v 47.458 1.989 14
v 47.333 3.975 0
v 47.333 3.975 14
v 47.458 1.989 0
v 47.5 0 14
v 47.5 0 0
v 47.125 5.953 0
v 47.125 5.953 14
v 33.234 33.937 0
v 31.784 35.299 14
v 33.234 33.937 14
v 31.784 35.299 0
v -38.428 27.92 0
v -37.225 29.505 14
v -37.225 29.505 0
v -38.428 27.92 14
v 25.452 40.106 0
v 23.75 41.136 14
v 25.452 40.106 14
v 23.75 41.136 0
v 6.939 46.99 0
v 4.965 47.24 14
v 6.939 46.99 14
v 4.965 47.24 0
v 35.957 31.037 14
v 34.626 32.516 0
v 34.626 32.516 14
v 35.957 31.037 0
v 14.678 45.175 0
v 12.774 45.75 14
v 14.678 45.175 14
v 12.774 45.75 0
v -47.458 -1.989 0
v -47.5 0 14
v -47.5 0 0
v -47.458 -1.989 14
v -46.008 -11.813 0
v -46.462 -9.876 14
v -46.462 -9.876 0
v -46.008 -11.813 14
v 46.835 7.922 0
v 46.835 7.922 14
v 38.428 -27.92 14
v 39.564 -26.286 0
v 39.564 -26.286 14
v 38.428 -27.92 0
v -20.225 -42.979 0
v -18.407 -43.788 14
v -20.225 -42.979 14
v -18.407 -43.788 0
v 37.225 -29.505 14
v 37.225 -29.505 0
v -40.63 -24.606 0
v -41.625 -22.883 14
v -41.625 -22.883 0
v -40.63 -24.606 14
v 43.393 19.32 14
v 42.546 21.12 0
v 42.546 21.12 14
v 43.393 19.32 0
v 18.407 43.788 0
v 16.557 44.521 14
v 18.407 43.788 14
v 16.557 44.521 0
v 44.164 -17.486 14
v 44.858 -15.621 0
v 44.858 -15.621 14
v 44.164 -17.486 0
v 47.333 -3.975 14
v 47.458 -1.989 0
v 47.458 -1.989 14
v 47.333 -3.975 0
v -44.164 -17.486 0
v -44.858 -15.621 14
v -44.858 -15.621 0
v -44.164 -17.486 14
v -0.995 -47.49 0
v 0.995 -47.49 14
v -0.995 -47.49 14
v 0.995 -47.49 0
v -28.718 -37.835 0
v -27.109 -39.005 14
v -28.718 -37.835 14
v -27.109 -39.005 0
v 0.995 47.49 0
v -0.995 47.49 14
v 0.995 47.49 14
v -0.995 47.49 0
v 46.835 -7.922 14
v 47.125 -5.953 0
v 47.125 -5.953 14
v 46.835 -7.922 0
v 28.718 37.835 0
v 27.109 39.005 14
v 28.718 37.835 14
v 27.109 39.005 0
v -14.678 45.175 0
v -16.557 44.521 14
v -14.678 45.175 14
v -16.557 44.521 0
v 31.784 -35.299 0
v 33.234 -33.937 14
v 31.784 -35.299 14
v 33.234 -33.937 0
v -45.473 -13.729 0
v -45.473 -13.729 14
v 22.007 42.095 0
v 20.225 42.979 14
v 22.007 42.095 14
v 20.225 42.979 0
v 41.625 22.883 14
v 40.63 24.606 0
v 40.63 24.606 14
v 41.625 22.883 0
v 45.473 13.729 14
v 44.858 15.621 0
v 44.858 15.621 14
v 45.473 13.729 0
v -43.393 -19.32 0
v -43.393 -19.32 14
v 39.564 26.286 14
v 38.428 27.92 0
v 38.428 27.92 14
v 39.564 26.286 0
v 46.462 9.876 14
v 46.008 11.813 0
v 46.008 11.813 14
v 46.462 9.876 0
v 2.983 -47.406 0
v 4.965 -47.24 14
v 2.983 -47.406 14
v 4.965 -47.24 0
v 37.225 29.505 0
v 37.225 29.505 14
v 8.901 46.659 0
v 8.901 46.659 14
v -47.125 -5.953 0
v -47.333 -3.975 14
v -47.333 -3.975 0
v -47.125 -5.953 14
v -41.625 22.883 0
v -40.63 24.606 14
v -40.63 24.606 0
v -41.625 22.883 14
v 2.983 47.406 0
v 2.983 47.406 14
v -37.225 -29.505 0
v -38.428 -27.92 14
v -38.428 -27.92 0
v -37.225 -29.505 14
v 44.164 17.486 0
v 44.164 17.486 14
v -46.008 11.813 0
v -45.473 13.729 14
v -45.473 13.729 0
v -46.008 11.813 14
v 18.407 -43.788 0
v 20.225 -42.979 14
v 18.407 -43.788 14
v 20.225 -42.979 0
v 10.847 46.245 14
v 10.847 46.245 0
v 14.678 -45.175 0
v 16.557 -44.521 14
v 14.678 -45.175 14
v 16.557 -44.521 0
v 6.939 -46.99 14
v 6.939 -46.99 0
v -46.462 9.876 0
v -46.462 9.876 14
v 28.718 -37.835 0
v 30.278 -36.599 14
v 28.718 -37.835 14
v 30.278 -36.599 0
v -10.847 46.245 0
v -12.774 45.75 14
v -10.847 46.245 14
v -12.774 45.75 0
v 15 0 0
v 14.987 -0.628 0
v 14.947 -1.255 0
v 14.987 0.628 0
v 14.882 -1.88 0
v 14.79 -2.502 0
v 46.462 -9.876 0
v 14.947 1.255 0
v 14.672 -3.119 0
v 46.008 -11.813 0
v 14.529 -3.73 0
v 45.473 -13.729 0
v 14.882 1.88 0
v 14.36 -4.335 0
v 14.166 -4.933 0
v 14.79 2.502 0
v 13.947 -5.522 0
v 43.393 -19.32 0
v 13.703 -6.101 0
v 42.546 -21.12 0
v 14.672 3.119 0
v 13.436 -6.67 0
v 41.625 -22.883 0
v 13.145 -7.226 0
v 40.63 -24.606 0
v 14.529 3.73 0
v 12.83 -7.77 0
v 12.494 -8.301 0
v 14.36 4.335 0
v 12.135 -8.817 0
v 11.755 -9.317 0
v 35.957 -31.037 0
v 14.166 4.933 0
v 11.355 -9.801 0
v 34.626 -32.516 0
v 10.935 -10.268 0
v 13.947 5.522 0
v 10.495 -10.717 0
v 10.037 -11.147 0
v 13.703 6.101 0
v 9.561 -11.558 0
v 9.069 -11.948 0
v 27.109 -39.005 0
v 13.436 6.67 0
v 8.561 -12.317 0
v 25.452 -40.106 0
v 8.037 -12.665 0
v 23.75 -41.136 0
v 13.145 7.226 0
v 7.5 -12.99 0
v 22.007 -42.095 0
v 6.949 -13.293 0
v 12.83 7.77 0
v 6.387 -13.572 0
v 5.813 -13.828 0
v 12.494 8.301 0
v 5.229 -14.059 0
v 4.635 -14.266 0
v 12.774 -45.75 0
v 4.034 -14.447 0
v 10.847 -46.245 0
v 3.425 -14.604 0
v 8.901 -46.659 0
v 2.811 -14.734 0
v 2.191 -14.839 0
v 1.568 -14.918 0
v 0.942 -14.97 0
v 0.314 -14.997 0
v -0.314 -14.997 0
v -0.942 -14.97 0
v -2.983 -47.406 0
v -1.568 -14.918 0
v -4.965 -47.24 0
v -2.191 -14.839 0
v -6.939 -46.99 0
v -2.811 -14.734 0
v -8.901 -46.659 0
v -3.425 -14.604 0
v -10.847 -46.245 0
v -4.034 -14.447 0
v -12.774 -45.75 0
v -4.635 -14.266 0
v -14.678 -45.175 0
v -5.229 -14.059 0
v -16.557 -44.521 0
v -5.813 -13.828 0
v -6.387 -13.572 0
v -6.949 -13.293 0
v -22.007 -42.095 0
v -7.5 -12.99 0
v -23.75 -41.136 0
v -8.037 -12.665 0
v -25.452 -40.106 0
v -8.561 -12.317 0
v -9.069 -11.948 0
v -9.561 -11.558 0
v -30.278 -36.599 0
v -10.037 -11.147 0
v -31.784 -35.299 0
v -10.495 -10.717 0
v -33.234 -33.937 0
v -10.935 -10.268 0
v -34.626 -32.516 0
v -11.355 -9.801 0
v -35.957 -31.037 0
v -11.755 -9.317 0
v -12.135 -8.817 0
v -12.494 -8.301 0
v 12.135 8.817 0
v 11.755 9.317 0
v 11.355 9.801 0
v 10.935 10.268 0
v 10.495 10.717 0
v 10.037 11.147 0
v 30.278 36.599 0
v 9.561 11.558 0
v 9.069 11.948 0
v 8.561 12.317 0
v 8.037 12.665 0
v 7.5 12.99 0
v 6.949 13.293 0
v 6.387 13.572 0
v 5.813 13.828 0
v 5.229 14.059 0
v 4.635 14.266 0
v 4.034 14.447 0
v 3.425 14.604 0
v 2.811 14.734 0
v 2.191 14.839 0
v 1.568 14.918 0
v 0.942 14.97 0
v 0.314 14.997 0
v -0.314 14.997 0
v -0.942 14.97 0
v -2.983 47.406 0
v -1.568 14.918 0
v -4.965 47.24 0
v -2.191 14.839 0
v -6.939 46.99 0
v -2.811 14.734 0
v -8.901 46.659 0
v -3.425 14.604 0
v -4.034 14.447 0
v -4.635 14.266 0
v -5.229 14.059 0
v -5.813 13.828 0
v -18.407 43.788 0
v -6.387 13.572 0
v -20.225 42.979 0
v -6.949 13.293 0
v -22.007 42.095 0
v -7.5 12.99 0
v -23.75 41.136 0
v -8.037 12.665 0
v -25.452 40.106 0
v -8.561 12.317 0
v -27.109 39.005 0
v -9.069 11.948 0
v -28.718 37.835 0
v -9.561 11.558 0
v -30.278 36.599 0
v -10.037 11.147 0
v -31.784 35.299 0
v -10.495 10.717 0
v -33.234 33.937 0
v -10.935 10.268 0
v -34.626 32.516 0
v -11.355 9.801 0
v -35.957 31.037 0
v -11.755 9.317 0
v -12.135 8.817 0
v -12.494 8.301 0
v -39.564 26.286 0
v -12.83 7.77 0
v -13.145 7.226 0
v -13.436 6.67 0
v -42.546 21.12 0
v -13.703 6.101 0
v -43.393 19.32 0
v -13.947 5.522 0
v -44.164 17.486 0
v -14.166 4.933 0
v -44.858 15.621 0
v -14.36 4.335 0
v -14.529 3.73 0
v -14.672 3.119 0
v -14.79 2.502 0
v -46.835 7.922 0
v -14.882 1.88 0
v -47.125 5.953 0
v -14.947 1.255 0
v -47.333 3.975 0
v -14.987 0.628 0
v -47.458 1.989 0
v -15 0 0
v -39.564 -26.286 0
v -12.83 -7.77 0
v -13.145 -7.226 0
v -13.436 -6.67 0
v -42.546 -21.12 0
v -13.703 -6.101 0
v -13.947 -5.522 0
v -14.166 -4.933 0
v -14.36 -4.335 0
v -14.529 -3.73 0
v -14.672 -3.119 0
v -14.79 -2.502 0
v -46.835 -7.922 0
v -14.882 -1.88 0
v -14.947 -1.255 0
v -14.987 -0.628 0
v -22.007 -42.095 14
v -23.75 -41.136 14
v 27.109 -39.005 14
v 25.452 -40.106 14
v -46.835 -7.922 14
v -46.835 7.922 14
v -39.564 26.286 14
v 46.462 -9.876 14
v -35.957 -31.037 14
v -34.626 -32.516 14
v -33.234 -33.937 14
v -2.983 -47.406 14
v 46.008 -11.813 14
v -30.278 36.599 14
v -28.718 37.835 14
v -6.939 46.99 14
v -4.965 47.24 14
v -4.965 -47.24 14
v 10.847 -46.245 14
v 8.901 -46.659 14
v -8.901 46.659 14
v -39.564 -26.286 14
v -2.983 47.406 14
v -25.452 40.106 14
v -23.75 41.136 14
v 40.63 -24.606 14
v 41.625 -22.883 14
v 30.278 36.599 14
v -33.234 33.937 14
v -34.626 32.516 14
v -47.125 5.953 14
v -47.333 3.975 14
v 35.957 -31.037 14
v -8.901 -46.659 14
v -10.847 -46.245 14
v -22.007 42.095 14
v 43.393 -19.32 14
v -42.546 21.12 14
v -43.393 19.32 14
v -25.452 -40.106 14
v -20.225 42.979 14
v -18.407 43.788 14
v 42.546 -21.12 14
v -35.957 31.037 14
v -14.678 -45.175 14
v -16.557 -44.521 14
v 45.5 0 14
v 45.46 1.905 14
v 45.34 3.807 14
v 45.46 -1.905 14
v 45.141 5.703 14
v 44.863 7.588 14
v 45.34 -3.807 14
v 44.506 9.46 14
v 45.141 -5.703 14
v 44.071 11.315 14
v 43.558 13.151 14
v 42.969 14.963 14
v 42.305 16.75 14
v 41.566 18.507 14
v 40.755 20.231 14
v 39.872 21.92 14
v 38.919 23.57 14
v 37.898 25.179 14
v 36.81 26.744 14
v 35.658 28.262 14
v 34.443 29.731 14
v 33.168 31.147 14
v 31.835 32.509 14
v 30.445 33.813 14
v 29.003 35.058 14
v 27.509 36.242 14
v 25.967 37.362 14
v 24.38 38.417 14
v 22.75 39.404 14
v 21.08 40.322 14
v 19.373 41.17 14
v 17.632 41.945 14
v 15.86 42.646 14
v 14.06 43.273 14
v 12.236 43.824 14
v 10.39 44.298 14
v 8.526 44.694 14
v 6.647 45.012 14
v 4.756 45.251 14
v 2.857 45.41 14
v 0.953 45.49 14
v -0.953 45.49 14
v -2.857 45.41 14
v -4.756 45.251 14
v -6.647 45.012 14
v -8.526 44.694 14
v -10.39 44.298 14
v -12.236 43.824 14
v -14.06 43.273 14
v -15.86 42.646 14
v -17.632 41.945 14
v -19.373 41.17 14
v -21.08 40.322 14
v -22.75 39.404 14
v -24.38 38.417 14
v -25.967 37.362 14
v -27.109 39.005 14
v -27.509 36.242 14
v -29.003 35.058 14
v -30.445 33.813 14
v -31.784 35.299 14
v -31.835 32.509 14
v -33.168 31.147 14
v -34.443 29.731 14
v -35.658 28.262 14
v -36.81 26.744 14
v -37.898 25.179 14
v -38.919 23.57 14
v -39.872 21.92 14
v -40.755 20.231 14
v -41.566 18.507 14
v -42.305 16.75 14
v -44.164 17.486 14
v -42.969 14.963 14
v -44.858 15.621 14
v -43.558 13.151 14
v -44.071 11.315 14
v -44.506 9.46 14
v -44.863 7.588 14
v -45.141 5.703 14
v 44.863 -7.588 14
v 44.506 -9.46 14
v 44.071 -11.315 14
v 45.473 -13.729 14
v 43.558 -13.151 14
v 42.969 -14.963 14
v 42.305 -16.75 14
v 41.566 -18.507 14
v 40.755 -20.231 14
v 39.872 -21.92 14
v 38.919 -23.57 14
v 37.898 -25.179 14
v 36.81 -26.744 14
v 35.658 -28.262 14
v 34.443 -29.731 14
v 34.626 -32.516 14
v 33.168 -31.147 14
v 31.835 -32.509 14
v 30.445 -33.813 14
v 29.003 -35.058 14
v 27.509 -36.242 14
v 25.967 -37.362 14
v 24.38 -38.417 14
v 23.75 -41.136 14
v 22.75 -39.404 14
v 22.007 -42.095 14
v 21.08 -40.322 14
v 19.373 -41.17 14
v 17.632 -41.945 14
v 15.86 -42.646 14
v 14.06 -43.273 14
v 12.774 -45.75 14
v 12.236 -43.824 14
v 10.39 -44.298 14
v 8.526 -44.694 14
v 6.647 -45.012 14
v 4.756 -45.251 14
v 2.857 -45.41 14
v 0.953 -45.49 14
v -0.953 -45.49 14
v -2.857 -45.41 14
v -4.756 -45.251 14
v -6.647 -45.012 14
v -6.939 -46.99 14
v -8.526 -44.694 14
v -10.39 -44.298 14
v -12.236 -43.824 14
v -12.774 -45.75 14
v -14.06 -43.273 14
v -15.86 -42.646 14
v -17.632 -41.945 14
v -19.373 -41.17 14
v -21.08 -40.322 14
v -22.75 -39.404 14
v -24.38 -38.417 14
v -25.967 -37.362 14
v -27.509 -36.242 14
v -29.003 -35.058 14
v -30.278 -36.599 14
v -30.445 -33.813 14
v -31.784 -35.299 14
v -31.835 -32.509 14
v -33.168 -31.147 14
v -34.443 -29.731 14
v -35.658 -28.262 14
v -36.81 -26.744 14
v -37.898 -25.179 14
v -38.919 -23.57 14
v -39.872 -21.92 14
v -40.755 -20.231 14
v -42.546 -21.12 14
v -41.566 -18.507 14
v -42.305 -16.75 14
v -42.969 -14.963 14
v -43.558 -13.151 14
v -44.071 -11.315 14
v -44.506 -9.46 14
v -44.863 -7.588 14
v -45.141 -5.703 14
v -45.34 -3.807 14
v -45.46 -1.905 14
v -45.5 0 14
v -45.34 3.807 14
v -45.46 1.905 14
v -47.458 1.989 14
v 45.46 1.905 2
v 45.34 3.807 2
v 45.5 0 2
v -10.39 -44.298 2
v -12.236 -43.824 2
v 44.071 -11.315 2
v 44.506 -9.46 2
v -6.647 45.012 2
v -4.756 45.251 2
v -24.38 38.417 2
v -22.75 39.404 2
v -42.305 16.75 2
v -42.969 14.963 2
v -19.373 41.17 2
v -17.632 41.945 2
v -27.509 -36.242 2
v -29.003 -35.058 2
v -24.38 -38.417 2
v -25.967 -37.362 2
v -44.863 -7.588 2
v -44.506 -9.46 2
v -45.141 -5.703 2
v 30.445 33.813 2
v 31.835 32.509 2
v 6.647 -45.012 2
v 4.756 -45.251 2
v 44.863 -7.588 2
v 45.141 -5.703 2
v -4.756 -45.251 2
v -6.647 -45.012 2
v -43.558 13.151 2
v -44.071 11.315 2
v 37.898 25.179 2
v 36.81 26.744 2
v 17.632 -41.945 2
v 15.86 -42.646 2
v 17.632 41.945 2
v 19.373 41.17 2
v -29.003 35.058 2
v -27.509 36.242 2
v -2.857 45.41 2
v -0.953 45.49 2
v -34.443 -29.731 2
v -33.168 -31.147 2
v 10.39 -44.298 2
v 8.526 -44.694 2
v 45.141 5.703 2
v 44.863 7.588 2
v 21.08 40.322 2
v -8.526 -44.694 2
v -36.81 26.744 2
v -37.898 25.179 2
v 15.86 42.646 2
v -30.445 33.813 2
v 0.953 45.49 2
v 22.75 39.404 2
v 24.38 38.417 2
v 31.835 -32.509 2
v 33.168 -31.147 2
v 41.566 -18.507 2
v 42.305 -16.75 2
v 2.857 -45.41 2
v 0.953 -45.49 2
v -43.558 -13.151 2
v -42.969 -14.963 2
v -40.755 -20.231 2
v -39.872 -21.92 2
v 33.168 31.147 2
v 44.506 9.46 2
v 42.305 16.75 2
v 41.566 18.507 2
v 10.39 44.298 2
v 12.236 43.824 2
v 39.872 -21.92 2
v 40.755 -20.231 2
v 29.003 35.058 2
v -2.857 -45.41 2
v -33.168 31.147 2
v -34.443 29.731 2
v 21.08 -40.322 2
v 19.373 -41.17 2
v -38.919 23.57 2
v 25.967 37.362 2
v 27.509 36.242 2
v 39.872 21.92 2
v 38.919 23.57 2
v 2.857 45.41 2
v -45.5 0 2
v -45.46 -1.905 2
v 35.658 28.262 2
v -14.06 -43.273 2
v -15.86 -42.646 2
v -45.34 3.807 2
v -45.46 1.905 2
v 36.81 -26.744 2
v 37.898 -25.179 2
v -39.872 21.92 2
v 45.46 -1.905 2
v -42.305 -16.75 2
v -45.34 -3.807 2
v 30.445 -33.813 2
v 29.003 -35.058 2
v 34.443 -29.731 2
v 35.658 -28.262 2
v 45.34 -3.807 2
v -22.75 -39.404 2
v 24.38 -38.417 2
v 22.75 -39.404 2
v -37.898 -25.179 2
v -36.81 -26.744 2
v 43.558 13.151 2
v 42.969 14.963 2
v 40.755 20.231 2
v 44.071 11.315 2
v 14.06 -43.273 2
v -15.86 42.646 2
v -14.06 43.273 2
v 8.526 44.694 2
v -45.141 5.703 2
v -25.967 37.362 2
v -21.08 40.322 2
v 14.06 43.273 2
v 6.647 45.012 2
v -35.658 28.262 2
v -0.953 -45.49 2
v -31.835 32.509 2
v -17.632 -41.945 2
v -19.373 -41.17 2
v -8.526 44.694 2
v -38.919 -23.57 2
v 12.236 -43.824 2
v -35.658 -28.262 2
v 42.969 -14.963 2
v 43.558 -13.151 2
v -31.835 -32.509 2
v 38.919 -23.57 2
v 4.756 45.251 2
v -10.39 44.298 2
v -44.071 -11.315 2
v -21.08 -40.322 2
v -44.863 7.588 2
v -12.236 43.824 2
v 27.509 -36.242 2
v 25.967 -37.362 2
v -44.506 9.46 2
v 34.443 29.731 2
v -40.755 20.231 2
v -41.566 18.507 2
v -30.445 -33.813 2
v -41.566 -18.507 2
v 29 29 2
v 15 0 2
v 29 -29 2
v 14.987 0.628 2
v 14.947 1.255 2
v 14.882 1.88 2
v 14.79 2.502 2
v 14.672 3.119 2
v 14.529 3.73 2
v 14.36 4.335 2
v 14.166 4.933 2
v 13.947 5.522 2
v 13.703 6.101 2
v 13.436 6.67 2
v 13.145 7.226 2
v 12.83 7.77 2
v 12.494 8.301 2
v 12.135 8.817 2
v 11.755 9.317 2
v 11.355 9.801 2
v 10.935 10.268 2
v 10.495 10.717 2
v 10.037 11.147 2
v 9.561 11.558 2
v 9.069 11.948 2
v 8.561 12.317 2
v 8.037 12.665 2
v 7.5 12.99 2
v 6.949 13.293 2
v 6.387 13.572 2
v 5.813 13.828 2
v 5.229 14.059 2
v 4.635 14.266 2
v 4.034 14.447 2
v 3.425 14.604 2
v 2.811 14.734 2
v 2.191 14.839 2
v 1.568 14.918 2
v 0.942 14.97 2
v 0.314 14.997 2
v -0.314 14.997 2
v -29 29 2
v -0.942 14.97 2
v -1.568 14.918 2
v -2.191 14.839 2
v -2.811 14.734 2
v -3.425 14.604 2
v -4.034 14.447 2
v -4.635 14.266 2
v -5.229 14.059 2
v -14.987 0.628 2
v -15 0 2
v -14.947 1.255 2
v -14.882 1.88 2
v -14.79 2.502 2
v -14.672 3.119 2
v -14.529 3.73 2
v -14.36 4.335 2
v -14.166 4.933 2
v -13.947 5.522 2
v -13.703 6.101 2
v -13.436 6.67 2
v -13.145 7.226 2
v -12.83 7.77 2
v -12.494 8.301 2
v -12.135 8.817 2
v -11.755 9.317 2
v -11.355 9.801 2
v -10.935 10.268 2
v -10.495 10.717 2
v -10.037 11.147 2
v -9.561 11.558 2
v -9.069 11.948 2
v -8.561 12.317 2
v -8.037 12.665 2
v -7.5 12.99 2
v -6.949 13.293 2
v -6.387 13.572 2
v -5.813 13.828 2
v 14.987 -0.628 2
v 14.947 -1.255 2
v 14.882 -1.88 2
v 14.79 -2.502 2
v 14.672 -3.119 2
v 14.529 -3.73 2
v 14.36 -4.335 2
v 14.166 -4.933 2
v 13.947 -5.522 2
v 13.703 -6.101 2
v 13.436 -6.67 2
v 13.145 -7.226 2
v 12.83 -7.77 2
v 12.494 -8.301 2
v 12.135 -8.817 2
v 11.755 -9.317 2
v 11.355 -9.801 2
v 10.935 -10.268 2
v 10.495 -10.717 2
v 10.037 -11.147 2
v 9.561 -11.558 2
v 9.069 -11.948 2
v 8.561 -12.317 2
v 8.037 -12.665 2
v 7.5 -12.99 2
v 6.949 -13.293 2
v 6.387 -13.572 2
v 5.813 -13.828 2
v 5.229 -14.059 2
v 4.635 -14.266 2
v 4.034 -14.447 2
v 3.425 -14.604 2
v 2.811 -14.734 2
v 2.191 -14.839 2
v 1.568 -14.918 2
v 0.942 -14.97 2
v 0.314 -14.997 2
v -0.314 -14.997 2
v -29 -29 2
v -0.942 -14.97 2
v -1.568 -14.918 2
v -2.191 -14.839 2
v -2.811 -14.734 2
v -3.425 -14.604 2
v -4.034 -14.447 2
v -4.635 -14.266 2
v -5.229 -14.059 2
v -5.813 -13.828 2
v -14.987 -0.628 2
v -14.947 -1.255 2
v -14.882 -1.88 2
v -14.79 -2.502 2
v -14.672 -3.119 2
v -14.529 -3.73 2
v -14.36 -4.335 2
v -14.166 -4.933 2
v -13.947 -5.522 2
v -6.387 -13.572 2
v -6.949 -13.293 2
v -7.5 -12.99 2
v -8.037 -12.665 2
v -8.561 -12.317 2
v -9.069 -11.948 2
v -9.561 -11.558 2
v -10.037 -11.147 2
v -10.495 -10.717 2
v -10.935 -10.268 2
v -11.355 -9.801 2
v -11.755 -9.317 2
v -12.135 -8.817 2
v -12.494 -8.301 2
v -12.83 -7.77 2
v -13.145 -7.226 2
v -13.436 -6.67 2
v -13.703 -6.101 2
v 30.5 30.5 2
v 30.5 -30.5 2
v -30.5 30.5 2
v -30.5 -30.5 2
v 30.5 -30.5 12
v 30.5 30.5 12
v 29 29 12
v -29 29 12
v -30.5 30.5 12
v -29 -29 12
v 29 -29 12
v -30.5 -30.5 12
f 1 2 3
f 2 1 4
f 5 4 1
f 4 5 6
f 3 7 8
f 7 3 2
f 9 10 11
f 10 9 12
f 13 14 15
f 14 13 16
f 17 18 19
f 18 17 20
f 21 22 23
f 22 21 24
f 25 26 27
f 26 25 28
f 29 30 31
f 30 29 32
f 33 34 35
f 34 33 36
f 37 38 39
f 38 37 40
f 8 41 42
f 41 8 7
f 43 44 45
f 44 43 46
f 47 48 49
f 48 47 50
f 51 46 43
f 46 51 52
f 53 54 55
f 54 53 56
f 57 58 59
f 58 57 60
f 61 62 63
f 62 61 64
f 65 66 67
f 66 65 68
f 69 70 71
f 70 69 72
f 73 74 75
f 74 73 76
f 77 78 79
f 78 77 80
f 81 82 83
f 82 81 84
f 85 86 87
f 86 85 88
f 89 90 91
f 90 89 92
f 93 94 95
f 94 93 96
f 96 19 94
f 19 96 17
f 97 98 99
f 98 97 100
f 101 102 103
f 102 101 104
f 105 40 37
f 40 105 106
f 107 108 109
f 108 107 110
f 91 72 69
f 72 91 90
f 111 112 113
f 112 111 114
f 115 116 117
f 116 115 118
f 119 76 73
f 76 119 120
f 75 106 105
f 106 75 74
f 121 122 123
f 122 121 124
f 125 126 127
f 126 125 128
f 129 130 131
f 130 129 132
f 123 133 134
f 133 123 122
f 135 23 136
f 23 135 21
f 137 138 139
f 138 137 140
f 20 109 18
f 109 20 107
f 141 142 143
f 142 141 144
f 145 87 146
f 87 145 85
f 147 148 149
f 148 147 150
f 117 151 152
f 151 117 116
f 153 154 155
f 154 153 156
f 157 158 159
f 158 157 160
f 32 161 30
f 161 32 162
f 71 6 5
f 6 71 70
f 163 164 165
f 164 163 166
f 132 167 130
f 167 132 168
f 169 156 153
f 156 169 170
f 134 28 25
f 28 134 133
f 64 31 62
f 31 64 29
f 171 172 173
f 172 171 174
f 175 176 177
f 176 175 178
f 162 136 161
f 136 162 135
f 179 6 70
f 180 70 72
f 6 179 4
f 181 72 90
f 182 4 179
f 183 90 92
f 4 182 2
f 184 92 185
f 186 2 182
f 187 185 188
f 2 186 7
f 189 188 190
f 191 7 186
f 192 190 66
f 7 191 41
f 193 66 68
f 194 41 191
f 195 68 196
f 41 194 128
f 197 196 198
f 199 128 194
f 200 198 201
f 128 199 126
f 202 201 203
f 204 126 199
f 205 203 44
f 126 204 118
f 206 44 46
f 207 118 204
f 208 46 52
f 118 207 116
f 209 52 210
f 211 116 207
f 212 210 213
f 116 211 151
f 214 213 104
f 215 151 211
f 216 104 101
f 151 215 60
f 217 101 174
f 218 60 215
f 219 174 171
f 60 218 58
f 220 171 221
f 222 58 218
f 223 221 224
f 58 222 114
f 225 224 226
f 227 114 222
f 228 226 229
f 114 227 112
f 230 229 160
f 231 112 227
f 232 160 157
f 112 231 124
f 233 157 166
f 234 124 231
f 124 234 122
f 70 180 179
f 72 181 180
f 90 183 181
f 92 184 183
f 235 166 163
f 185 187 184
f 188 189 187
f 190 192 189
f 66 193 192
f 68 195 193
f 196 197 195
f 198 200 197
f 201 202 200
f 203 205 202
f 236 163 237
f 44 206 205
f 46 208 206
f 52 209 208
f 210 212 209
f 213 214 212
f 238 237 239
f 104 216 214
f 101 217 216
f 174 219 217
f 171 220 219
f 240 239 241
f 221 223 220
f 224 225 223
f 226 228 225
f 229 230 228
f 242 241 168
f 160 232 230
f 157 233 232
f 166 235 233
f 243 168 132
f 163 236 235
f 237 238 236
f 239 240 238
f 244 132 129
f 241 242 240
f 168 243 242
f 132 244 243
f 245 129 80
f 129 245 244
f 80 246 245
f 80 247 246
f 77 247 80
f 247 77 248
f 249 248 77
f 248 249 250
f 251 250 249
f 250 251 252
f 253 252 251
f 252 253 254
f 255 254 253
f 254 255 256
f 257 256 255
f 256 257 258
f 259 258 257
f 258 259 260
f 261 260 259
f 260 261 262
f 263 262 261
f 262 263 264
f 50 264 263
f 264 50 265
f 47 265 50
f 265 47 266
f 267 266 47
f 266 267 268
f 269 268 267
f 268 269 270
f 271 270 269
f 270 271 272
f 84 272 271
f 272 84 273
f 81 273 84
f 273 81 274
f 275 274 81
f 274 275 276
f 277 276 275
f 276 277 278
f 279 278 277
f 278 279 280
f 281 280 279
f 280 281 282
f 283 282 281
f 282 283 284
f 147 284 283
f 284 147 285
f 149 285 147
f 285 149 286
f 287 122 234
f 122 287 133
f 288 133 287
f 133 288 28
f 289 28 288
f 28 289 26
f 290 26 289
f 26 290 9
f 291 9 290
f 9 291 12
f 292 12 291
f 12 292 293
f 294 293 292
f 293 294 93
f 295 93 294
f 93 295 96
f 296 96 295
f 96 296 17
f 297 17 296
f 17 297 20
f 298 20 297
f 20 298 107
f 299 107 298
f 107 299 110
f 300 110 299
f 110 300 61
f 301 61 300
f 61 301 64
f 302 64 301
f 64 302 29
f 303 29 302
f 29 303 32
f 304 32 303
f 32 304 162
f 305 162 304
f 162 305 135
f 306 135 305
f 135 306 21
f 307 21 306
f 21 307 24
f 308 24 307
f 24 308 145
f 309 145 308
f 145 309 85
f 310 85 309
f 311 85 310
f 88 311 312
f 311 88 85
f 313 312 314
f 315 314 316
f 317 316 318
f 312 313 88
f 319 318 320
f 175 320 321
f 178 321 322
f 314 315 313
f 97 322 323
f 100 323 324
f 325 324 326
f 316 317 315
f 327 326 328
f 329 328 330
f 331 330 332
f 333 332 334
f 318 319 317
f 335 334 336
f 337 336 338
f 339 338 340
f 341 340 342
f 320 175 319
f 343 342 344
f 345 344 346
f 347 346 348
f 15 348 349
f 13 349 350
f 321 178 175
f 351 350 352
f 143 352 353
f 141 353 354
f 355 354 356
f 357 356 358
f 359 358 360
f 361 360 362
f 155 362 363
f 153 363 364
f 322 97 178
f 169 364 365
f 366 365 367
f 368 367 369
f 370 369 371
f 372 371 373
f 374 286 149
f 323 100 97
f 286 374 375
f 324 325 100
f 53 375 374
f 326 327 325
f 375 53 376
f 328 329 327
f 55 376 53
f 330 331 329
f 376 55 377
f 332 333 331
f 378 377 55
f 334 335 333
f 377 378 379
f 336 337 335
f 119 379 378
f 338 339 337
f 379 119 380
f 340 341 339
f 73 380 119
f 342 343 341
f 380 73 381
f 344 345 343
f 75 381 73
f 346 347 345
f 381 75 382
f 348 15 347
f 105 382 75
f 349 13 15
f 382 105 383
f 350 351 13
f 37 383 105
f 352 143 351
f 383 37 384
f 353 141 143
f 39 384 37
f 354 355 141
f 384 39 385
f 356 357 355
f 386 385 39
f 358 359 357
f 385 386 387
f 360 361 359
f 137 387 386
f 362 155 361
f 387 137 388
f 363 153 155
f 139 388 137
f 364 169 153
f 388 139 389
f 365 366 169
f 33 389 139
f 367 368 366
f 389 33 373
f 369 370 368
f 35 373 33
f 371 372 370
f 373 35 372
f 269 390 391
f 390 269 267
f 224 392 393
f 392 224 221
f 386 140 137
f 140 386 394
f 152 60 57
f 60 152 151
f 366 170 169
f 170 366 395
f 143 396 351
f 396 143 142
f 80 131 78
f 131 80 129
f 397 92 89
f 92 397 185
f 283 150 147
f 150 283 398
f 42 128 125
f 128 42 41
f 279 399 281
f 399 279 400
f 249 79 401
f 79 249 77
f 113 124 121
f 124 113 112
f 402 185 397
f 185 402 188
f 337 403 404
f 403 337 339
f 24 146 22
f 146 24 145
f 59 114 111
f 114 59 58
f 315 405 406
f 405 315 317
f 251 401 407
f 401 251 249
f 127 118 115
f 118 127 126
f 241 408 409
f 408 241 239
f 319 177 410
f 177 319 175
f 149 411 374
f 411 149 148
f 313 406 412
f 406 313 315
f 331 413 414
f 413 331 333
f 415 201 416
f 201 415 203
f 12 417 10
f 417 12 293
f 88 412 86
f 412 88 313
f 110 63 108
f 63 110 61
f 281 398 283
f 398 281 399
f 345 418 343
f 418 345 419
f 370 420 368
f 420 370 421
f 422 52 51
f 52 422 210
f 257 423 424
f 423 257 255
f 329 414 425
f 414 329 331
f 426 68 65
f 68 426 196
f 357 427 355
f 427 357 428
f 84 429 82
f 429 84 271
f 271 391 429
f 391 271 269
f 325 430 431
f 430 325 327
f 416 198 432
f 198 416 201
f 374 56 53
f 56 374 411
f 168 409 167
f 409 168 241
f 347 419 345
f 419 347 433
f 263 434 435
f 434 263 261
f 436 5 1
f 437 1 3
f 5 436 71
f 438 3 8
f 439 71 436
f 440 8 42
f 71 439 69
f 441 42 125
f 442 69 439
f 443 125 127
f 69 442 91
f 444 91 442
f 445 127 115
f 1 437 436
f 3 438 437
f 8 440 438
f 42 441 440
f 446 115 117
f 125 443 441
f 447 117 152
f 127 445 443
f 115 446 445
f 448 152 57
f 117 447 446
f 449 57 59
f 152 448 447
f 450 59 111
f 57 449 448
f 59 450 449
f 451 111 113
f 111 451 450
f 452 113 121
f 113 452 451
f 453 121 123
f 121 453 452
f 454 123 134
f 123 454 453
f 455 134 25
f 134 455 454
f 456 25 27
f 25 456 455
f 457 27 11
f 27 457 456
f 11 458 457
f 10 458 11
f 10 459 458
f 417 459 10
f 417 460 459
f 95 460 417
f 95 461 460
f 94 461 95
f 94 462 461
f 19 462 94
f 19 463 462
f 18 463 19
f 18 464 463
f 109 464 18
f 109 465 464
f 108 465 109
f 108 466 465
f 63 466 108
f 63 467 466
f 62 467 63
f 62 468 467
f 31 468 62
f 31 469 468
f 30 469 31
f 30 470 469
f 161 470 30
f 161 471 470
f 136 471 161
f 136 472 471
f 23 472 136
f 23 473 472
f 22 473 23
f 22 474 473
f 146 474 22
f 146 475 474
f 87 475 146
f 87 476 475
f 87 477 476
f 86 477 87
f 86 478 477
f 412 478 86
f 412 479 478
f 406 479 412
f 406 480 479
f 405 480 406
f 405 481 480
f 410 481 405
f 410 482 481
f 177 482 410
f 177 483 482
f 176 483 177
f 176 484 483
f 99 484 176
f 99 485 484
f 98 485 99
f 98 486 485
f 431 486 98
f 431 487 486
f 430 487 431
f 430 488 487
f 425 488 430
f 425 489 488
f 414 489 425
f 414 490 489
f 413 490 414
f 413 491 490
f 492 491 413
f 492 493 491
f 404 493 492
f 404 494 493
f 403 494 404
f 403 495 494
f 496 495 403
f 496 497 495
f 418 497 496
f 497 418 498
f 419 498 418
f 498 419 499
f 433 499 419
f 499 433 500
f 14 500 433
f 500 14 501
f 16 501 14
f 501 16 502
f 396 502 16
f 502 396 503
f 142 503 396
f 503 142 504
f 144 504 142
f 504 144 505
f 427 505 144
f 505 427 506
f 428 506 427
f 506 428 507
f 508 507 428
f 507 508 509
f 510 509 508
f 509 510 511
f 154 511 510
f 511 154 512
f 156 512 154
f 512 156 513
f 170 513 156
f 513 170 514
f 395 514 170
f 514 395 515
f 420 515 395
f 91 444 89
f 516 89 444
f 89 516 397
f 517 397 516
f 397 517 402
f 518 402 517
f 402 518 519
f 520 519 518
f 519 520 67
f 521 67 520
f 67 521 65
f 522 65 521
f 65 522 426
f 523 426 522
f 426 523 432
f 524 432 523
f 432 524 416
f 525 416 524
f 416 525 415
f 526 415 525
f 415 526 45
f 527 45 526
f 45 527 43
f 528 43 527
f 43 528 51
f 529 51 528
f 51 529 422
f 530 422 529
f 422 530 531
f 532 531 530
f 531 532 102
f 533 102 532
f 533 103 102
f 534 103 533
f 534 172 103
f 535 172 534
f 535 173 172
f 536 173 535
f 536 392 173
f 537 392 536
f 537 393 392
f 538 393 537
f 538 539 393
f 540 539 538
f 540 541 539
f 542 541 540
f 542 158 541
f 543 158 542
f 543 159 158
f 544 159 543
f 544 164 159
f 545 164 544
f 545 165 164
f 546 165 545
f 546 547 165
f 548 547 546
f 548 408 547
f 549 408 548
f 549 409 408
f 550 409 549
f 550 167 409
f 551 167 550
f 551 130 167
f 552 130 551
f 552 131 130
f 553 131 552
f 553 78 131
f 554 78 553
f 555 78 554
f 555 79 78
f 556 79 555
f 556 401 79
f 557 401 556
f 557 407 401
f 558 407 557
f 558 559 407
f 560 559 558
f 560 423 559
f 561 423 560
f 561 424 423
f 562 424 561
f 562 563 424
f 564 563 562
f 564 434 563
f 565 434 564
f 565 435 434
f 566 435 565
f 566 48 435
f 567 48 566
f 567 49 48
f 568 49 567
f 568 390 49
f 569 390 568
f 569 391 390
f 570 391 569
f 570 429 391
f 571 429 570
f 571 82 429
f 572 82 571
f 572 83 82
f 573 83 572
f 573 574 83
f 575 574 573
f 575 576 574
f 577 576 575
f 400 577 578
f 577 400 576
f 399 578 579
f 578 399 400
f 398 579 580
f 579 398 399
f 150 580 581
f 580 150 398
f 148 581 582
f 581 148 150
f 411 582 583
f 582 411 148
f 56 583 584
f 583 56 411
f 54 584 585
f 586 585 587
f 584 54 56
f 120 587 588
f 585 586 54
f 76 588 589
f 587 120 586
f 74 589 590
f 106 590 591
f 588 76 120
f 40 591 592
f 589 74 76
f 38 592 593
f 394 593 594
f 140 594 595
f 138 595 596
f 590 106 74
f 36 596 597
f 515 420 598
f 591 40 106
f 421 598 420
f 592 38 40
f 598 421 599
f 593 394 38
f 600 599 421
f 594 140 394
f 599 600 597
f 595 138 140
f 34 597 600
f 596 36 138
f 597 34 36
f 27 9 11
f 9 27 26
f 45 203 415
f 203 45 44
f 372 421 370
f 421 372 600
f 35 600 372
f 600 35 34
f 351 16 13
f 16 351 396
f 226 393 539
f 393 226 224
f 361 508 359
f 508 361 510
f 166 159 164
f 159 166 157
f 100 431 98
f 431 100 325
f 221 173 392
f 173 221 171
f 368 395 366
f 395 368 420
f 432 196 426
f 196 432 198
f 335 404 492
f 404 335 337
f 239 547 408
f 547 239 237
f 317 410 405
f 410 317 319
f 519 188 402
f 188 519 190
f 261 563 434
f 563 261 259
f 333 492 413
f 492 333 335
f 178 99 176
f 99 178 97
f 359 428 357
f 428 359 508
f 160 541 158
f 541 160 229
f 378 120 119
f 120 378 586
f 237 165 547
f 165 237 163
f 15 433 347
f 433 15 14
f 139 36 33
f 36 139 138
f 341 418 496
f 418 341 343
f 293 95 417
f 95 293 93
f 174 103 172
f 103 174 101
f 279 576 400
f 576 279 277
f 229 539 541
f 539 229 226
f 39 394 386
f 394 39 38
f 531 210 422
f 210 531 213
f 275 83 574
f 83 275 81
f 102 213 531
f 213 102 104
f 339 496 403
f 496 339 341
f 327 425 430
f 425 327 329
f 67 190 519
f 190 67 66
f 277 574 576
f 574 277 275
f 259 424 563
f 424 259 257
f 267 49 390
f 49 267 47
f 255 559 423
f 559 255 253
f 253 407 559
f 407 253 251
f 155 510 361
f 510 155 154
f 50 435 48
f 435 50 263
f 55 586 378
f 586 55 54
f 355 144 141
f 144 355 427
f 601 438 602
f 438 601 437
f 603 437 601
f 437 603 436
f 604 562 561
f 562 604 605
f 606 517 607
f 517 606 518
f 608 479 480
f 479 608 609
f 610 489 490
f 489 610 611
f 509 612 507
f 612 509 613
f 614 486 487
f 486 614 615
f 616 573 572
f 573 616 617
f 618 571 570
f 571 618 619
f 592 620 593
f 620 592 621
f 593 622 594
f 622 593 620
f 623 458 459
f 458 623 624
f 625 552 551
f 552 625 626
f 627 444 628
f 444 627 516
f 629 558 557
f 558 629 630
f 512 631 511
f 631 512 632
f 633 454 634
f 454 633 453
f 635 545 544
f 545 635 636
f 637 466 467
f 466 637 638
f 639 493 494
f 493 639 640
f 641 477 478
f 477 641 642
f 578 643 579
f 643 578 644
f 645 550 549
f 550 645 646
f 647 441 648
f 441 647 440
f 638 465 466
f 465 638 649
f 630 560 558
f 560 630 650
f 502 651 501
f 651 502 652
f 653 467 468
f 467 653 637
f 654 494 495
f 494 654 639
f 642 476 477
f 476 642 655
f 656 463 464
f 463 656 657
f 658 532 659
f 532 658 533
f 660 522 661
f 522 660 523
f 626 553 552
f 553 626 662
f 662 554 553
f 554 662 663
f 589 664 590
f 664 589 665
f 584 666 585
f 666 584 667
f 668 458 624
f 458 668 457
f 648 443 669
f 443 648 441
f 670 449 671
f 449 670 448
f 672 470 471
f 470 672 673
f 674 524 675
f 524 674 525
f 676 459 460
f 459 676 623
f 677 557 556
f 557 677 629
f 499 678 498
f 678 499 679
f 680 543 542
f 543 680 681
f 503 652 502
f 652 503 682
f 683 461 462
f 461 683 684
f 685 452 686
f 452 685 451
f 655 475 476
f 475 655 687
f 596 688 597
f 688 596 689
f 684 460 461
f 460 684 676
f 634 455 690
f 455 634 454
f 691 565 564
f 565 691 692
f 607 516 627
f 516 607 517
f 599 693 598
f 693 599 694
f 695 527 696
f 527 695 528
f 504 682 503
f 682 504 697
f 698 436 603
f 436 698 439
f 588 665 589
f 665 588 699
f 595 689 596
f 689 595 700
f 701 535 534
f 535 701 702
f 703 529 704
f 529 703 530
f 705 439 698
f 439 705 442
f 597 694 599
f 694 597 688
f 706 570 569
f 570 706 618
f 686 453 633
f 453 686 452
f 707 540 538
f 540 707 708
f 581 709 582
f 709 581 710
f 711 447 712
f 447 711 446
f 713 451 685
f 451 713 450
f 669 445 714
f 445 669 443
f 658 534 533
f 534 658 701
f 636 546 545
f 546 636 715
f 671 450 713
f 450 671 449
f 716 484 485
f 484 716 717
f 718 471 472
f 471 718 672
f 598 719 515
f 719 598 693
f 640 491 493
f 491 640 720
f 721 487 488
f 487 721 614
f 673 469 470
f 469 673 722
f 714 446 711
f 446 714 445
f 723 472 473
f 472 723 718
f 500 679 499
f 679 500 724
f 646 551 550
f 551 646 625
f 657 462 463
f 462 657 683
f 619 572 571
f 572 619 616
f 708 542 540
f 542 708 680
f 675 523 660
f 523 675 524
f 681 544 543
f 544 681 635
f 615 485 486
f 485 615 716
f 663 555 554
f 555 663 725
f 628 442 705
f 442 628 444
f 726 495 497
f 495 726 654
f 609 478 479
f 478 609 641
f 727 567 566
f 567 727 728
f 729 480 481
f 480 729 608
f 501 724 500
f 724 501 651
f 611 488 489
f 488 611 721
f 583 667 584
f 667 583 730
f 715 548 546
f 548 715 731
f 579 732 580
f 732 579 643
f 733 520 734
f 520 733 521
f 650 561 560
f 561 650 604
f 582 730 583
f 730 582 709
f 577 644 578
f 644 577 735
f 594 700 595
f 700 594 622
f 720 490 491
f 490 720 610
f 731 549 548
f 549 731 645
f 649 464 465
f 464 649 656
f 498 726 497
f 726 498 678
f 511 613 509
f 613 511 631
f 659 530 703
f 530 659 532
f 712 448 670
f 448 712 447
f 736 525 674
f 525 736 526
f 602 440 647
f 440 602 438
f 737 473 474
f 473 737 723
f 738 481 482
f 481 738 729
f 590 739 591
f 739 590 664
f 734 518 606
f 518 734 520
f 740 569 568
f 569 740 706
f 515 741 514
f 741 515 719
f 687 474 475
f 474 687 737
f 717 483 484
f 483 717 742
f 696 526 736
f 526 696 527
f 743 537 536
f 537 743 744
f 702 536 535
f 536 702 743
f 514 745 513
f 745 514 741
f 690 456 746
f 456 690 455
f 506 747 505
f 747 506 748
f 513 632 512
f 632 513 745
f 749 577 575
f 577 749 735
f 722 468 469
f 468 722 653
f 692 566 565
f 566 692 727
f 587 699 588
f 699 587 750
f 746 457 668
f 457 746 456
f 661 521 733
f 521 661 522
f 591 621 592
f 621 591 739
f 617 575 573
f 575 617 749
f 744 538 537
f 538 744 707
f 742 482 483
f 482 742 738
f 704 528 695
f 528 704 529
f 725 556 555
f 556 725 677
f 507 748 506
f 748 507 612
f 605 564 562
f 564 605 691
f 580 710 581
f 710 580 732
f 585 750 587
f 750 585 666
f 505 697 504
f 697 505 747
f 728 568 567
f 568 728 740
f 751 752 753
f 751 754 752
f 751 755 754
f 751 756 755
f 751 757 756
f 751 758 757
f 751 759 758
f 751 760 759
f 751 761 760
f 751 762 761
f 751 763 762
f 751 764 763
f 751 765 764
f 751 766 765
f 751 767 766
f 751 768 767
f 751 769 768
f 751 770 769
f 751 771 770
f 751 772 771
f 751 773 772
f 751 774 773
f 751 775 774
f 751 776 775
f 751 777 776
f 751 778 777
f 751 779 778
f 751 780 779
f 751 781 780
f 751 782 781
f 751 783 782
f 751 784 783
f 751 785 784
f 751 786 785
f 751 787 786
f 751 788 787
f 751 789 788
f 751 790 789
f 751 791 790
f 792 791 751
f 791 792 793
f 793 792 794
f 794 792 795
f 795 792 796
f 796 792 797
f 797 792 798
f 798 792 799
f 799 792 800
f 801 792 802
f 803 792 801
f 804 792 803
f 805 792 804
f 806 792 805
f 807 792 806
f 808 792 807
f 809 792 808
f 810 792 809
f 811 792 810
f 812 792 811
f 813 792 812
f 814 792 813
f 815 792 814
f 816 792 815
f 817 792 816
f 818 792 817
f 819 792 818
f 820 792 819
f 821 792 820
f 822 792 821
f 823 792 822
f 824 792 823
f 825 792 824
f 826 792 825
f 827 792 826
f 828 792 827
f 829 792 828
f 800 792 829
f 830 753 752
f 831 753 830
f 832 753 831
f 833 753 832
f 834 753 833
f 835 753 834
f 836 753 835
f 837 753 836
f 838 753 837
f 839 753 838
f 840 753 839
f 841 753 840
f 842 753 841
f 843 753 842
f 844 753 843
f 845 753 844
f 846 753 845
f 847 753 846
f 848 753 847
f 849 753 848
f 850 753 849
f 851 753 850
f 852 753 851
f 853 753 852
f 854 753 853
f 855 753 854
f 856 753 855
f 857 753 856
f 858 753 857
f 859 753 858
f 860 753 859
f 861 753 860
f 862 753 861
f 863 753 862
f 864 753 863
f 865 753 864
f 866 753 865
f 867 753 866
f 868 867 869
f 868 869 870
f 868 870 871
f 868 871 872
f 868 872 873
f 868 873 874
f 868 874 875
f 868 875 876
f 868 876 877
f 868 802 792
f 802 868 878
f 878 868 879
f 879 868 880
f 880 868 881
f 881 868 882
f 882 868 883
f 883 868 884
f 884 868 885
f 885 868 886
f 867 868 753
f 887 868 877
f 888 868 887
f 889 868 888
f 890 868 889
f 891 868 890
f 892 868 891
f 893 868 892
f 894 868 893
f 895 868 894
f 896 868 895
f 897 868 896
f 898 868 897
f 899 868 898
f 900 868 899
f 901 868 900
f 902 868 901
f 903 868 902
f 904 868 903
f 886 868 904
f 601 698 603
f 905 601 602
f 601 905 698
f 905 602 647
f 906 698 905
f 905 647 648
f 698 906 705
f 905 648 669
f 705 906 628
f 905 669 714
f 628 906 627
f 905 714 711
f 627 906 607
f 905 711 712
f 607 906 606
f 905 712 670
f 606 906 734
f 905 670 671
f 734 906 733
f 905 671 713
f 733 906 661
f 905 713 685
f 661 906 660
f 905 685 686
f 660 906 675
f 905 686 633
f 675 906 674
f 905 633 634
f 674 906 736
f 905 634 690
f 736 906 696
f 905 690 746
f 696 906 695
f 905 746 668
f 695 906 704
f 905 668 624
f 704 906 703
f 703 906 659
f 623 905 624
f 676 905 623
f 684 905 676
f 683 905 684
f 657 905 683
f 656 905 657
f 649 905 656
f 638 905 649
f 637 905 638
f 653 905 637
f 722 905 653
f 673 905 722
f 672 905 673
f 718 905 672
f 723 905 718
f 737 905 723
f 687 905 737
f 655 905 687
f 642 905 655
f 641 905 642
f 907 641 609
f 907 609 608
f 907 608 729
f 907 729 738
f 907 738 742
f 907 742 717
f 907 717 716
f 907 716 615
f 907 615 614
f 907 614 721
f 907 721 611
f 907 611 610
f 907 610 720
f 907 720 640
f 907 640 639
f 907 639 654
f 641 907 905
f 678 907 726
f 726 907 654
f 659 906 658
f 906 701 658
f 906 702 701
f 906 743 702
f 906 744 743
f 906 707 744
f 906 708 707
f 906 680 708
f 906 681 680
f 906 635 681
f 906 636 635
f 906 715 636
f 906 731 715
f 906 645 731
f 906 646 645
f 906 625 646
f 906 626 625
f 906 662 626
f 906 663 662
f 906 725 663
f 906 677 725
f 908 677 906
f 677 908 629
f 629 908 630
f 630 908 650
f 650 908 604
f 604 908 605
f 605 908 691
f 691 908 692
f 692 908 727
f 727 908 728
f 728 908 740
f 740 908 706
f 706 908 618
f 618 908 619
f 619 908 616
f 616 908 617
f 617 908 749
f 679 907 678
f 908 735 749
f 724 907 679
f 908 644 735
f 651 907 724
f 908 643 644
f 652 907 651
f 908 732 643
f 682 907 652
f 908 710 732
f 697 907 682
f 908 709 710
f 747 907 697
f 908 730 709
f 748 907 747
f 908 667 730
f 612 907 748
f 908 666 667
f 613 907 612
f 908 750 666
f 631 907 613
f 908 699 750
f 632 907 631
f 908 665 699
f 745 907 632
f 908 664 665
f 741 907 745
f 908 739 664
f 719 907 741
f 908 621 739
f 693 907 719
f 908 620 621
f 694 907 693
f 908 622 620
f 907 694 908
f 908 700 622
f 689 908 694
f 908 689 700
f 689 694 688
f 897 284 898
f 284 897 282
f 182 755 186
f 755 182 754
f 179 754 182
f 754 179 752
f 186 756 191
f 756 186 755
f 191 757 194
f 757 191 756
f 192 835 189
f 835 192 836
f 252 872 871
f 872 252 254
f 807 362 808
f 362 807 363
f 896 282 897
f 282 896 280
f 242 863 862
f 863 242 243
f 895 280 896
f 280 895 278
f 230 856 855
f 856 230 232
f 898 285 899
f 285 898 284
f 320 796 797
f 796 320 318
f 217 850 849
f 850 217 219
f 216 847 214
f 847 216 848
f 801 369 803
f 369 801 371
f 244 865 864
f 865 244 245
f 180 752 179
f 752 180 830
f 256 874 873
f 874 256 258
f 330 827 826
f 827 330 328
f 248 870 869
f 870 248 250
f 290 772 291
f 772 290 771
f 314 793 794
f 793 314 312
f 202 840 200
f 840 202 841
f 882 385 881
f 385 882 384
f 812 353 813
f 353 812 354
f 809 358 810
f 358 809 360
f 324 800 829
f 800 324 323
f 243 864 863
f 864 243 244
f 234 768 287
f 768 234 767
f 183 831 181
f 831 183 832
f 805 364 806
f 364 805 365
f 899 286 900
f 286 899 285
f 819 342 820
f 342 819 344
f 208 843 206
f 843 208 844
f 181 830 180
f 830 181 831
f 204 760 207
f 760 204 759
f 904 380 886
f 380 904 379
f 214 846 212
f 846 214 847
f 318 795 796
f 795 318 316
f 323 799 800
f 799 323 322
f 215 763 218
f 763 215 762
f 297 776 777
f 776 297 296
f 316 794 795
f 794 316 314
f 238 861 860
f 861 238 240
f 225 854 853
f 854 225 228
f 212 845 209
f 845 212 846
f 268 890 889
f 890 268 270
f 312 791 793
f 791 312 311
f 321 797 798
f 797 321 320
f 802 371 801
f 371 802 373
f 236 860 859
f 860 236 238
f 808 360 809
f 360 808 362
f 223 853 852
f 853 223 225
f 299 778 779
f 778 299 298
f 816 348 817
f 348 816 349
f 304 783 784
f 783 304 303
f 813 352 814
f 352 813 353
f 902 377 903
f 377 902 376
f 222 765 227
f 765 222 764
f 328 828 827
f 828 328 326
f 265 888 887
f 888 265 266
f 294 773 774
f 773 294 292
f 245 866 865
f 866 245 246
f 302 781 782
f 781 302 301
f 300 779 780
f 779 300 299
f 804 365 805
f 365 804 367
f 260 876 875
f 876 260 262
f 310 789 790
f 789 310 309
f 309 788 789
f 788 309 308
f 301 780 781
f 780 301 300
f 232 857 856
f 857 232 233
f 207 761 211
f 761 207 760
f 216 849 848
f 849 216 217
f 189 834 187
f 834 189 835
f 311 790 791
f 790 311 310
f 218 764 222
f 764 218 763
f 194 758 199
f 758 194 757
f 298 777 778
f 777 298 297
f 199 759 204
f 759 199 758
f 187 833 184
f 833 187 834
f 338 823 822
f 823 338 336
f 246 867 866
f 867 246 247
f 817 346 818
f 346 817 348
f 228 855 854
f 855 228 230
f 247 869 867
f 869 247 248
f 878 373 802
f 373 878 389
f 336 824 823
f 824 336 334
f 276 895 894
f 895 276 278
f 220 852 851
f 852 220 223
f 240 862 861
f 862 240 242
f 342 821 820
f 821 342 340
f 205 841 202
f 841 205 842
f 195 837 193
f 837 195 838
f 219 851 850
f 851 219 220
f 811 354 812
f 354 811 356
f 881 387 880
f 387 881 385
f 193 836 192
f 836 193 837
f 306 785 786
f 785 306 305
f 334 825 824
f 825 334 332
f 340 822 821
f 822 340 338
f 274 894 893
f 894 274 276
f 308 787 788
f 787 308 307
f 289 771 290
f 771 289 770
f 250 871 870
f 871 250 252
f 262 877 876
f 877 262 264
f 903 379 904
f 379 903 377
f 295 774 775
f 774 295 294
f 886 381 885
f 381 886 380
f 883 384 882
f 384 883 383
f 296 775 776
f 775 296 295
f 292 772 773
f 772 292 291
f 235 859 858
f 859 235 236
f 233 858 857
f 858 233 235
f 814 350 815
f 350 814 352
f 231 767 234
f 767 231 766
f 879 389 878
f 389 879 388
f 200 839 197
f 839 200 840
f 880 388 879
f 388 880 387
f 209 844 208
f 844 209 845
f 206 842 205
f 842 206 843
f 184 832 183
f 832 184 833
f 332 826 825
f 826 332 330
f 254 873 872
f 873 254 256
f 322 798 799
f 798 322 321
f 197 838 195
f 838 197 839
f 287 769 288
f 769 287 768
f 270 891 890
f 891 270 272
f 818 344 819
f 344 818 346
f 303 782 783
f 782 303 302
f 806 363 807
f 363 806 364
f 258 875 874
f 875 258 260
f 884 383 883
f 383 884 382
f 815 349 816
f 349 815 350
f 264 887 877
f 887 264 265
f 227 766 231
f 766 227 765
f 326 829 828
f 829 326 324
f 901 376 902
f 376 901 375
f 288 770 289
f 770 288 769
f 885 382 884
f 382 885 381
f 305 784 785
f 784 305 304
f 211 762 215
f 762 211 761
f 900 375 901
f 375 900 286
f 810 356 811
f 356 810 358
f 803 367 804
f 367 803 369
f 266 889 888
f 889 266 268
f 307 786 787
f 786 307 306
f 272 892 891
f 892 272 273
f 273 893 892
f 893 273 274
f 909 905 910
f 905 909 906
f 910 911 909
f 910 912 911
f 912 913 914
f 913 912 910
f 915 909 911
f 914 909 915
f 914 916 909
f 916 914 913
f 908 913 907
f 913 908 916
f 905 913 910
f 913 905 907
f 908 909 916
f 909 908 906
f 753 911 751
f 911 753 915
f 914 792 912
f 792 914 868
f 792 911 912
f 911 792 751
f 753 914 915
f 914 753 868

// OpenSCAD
part = "2"; // [1: Clock Face, 2:Clockwork Bracket, 3:Diffusor Bracket, 4:Diffusor Panel, 5:Diffusor Seam, 6: Diffusor Seam with cable hole]


//in mm
diameter = 200; // [150:300]

//hole diameter in mm
core_inner = 95; // [50:150]

//diameter in mm (The surface that the Filament sits on)
core_outer = 100; // [82:152]

//in mm (Measure only the slot, not the walls of the spool!)
spool_width = 62; // [40:100] 


//in mm
clockwork_size = 56; // [30:80]



print_part();


module print_part(){
    
    if (part == "1") {
        clockface();
    }
    else if (part == "2") {
        clockwork();
    }
    else if (part == "3") {
        diff_bracket();
    }
    else if (part == "4") {
        diff_panel();
    }
    else if (part == "5") {
        diff_seam();
    }
    else if (part == "6") {
        diff_seam_02();
    }  
    }




module clockface() {

union() {

difference()   {
    $fn = 100;
    cylinder(2,d = diameter- 1, d = diameter-1);
    
    translate([0,0,-0.5])cylinder(3, d = diameter - 10, d = diameter-10);
    
               }
               
for (i = [1:60]) {
    rotate(a = i * 6, v = [0, 0, 1])translate([-1, diameter/2-10 , 0]) cube([2,6,2]);
                 }
 
for (i = [1:12])  {
    rotate(a = i * 360/12, v = [0, 0, 1])translate([-2, diameter/2-13 , 0]) cube([4,9,2]);
                 }
       }}






module clockwork() {
    
union() {

difference() {

$fn = 150;

cylinder(14, d = core_inner, d = core_inner);

translate ([0, 0, 2]) cylinder(14, d = core_inner- 4, d = core_inner - 4);
    
difference() {
    translate([0, 0, -2]) cylinder(15, 15, 15);
    
    }}
    
difference() {
    translate([-(clockwork_size+5)/2,-(clockwork_size+5)/2,0]) cube(size = [clockwork_size+5,clockwork_size+5,12]);
    translate([-(clockwork_size+2)/2,-(clockwork_size+2)/2,2]) cube([clockwork_size+2,clockwork_size+2,20]);
    
$fn = 150;
    
difference() {
    translate([0, 0, -2]) cylinder(15, 15, 15);
            }}}}
            
            



module diff_bracket() {

    
difference() {
           
        
intersection() {
    translate([1,1,0]) cube([diameter,diameter,diameter]);

    difference() {
        $fn = 200;
        difference() {
            cylinder(4, d = diameter-4, d = diameter-4);
            translate ([0,0,1]) cylinder(4.1, d = diameter-6, d =   diameter-6);
            }
        translate([0,0,-1]) cylinder(5, d =  core_outer+0.5 , d = core_outer+0.5);
        }}
        
intersection() {
        translate([15,15,-1]) cube([diameter, diameter, diameter]);
        $fn = 100;
    difference() {
        translate([0,0,-1])cylinder(diameter+2, d = diameter-30, d = diameter-30);
    difference() {
        translate([0,0,-1]) cylinder( diameter+2, d = core_outer+30, d = core_outer+30);
        
    }}}}}
           




module diff_panel() {

cube(size = [spool_width-1, diameter* 3.1415/4-4, 0.21]);
    
                    }
                    
                    
                    
module diff_seam() {
    
cube([spool_width, 5, 2]);
    
                   }


module diff_seam_02() {
    
difference() {
    
union() {

cube([spool_width, 5, 2]);

translate([0,-2,0]) cube([9, 9, 2]);
    
        }
    
translate([-0.01,0,-2])cube([6,5,10]);
            }}
